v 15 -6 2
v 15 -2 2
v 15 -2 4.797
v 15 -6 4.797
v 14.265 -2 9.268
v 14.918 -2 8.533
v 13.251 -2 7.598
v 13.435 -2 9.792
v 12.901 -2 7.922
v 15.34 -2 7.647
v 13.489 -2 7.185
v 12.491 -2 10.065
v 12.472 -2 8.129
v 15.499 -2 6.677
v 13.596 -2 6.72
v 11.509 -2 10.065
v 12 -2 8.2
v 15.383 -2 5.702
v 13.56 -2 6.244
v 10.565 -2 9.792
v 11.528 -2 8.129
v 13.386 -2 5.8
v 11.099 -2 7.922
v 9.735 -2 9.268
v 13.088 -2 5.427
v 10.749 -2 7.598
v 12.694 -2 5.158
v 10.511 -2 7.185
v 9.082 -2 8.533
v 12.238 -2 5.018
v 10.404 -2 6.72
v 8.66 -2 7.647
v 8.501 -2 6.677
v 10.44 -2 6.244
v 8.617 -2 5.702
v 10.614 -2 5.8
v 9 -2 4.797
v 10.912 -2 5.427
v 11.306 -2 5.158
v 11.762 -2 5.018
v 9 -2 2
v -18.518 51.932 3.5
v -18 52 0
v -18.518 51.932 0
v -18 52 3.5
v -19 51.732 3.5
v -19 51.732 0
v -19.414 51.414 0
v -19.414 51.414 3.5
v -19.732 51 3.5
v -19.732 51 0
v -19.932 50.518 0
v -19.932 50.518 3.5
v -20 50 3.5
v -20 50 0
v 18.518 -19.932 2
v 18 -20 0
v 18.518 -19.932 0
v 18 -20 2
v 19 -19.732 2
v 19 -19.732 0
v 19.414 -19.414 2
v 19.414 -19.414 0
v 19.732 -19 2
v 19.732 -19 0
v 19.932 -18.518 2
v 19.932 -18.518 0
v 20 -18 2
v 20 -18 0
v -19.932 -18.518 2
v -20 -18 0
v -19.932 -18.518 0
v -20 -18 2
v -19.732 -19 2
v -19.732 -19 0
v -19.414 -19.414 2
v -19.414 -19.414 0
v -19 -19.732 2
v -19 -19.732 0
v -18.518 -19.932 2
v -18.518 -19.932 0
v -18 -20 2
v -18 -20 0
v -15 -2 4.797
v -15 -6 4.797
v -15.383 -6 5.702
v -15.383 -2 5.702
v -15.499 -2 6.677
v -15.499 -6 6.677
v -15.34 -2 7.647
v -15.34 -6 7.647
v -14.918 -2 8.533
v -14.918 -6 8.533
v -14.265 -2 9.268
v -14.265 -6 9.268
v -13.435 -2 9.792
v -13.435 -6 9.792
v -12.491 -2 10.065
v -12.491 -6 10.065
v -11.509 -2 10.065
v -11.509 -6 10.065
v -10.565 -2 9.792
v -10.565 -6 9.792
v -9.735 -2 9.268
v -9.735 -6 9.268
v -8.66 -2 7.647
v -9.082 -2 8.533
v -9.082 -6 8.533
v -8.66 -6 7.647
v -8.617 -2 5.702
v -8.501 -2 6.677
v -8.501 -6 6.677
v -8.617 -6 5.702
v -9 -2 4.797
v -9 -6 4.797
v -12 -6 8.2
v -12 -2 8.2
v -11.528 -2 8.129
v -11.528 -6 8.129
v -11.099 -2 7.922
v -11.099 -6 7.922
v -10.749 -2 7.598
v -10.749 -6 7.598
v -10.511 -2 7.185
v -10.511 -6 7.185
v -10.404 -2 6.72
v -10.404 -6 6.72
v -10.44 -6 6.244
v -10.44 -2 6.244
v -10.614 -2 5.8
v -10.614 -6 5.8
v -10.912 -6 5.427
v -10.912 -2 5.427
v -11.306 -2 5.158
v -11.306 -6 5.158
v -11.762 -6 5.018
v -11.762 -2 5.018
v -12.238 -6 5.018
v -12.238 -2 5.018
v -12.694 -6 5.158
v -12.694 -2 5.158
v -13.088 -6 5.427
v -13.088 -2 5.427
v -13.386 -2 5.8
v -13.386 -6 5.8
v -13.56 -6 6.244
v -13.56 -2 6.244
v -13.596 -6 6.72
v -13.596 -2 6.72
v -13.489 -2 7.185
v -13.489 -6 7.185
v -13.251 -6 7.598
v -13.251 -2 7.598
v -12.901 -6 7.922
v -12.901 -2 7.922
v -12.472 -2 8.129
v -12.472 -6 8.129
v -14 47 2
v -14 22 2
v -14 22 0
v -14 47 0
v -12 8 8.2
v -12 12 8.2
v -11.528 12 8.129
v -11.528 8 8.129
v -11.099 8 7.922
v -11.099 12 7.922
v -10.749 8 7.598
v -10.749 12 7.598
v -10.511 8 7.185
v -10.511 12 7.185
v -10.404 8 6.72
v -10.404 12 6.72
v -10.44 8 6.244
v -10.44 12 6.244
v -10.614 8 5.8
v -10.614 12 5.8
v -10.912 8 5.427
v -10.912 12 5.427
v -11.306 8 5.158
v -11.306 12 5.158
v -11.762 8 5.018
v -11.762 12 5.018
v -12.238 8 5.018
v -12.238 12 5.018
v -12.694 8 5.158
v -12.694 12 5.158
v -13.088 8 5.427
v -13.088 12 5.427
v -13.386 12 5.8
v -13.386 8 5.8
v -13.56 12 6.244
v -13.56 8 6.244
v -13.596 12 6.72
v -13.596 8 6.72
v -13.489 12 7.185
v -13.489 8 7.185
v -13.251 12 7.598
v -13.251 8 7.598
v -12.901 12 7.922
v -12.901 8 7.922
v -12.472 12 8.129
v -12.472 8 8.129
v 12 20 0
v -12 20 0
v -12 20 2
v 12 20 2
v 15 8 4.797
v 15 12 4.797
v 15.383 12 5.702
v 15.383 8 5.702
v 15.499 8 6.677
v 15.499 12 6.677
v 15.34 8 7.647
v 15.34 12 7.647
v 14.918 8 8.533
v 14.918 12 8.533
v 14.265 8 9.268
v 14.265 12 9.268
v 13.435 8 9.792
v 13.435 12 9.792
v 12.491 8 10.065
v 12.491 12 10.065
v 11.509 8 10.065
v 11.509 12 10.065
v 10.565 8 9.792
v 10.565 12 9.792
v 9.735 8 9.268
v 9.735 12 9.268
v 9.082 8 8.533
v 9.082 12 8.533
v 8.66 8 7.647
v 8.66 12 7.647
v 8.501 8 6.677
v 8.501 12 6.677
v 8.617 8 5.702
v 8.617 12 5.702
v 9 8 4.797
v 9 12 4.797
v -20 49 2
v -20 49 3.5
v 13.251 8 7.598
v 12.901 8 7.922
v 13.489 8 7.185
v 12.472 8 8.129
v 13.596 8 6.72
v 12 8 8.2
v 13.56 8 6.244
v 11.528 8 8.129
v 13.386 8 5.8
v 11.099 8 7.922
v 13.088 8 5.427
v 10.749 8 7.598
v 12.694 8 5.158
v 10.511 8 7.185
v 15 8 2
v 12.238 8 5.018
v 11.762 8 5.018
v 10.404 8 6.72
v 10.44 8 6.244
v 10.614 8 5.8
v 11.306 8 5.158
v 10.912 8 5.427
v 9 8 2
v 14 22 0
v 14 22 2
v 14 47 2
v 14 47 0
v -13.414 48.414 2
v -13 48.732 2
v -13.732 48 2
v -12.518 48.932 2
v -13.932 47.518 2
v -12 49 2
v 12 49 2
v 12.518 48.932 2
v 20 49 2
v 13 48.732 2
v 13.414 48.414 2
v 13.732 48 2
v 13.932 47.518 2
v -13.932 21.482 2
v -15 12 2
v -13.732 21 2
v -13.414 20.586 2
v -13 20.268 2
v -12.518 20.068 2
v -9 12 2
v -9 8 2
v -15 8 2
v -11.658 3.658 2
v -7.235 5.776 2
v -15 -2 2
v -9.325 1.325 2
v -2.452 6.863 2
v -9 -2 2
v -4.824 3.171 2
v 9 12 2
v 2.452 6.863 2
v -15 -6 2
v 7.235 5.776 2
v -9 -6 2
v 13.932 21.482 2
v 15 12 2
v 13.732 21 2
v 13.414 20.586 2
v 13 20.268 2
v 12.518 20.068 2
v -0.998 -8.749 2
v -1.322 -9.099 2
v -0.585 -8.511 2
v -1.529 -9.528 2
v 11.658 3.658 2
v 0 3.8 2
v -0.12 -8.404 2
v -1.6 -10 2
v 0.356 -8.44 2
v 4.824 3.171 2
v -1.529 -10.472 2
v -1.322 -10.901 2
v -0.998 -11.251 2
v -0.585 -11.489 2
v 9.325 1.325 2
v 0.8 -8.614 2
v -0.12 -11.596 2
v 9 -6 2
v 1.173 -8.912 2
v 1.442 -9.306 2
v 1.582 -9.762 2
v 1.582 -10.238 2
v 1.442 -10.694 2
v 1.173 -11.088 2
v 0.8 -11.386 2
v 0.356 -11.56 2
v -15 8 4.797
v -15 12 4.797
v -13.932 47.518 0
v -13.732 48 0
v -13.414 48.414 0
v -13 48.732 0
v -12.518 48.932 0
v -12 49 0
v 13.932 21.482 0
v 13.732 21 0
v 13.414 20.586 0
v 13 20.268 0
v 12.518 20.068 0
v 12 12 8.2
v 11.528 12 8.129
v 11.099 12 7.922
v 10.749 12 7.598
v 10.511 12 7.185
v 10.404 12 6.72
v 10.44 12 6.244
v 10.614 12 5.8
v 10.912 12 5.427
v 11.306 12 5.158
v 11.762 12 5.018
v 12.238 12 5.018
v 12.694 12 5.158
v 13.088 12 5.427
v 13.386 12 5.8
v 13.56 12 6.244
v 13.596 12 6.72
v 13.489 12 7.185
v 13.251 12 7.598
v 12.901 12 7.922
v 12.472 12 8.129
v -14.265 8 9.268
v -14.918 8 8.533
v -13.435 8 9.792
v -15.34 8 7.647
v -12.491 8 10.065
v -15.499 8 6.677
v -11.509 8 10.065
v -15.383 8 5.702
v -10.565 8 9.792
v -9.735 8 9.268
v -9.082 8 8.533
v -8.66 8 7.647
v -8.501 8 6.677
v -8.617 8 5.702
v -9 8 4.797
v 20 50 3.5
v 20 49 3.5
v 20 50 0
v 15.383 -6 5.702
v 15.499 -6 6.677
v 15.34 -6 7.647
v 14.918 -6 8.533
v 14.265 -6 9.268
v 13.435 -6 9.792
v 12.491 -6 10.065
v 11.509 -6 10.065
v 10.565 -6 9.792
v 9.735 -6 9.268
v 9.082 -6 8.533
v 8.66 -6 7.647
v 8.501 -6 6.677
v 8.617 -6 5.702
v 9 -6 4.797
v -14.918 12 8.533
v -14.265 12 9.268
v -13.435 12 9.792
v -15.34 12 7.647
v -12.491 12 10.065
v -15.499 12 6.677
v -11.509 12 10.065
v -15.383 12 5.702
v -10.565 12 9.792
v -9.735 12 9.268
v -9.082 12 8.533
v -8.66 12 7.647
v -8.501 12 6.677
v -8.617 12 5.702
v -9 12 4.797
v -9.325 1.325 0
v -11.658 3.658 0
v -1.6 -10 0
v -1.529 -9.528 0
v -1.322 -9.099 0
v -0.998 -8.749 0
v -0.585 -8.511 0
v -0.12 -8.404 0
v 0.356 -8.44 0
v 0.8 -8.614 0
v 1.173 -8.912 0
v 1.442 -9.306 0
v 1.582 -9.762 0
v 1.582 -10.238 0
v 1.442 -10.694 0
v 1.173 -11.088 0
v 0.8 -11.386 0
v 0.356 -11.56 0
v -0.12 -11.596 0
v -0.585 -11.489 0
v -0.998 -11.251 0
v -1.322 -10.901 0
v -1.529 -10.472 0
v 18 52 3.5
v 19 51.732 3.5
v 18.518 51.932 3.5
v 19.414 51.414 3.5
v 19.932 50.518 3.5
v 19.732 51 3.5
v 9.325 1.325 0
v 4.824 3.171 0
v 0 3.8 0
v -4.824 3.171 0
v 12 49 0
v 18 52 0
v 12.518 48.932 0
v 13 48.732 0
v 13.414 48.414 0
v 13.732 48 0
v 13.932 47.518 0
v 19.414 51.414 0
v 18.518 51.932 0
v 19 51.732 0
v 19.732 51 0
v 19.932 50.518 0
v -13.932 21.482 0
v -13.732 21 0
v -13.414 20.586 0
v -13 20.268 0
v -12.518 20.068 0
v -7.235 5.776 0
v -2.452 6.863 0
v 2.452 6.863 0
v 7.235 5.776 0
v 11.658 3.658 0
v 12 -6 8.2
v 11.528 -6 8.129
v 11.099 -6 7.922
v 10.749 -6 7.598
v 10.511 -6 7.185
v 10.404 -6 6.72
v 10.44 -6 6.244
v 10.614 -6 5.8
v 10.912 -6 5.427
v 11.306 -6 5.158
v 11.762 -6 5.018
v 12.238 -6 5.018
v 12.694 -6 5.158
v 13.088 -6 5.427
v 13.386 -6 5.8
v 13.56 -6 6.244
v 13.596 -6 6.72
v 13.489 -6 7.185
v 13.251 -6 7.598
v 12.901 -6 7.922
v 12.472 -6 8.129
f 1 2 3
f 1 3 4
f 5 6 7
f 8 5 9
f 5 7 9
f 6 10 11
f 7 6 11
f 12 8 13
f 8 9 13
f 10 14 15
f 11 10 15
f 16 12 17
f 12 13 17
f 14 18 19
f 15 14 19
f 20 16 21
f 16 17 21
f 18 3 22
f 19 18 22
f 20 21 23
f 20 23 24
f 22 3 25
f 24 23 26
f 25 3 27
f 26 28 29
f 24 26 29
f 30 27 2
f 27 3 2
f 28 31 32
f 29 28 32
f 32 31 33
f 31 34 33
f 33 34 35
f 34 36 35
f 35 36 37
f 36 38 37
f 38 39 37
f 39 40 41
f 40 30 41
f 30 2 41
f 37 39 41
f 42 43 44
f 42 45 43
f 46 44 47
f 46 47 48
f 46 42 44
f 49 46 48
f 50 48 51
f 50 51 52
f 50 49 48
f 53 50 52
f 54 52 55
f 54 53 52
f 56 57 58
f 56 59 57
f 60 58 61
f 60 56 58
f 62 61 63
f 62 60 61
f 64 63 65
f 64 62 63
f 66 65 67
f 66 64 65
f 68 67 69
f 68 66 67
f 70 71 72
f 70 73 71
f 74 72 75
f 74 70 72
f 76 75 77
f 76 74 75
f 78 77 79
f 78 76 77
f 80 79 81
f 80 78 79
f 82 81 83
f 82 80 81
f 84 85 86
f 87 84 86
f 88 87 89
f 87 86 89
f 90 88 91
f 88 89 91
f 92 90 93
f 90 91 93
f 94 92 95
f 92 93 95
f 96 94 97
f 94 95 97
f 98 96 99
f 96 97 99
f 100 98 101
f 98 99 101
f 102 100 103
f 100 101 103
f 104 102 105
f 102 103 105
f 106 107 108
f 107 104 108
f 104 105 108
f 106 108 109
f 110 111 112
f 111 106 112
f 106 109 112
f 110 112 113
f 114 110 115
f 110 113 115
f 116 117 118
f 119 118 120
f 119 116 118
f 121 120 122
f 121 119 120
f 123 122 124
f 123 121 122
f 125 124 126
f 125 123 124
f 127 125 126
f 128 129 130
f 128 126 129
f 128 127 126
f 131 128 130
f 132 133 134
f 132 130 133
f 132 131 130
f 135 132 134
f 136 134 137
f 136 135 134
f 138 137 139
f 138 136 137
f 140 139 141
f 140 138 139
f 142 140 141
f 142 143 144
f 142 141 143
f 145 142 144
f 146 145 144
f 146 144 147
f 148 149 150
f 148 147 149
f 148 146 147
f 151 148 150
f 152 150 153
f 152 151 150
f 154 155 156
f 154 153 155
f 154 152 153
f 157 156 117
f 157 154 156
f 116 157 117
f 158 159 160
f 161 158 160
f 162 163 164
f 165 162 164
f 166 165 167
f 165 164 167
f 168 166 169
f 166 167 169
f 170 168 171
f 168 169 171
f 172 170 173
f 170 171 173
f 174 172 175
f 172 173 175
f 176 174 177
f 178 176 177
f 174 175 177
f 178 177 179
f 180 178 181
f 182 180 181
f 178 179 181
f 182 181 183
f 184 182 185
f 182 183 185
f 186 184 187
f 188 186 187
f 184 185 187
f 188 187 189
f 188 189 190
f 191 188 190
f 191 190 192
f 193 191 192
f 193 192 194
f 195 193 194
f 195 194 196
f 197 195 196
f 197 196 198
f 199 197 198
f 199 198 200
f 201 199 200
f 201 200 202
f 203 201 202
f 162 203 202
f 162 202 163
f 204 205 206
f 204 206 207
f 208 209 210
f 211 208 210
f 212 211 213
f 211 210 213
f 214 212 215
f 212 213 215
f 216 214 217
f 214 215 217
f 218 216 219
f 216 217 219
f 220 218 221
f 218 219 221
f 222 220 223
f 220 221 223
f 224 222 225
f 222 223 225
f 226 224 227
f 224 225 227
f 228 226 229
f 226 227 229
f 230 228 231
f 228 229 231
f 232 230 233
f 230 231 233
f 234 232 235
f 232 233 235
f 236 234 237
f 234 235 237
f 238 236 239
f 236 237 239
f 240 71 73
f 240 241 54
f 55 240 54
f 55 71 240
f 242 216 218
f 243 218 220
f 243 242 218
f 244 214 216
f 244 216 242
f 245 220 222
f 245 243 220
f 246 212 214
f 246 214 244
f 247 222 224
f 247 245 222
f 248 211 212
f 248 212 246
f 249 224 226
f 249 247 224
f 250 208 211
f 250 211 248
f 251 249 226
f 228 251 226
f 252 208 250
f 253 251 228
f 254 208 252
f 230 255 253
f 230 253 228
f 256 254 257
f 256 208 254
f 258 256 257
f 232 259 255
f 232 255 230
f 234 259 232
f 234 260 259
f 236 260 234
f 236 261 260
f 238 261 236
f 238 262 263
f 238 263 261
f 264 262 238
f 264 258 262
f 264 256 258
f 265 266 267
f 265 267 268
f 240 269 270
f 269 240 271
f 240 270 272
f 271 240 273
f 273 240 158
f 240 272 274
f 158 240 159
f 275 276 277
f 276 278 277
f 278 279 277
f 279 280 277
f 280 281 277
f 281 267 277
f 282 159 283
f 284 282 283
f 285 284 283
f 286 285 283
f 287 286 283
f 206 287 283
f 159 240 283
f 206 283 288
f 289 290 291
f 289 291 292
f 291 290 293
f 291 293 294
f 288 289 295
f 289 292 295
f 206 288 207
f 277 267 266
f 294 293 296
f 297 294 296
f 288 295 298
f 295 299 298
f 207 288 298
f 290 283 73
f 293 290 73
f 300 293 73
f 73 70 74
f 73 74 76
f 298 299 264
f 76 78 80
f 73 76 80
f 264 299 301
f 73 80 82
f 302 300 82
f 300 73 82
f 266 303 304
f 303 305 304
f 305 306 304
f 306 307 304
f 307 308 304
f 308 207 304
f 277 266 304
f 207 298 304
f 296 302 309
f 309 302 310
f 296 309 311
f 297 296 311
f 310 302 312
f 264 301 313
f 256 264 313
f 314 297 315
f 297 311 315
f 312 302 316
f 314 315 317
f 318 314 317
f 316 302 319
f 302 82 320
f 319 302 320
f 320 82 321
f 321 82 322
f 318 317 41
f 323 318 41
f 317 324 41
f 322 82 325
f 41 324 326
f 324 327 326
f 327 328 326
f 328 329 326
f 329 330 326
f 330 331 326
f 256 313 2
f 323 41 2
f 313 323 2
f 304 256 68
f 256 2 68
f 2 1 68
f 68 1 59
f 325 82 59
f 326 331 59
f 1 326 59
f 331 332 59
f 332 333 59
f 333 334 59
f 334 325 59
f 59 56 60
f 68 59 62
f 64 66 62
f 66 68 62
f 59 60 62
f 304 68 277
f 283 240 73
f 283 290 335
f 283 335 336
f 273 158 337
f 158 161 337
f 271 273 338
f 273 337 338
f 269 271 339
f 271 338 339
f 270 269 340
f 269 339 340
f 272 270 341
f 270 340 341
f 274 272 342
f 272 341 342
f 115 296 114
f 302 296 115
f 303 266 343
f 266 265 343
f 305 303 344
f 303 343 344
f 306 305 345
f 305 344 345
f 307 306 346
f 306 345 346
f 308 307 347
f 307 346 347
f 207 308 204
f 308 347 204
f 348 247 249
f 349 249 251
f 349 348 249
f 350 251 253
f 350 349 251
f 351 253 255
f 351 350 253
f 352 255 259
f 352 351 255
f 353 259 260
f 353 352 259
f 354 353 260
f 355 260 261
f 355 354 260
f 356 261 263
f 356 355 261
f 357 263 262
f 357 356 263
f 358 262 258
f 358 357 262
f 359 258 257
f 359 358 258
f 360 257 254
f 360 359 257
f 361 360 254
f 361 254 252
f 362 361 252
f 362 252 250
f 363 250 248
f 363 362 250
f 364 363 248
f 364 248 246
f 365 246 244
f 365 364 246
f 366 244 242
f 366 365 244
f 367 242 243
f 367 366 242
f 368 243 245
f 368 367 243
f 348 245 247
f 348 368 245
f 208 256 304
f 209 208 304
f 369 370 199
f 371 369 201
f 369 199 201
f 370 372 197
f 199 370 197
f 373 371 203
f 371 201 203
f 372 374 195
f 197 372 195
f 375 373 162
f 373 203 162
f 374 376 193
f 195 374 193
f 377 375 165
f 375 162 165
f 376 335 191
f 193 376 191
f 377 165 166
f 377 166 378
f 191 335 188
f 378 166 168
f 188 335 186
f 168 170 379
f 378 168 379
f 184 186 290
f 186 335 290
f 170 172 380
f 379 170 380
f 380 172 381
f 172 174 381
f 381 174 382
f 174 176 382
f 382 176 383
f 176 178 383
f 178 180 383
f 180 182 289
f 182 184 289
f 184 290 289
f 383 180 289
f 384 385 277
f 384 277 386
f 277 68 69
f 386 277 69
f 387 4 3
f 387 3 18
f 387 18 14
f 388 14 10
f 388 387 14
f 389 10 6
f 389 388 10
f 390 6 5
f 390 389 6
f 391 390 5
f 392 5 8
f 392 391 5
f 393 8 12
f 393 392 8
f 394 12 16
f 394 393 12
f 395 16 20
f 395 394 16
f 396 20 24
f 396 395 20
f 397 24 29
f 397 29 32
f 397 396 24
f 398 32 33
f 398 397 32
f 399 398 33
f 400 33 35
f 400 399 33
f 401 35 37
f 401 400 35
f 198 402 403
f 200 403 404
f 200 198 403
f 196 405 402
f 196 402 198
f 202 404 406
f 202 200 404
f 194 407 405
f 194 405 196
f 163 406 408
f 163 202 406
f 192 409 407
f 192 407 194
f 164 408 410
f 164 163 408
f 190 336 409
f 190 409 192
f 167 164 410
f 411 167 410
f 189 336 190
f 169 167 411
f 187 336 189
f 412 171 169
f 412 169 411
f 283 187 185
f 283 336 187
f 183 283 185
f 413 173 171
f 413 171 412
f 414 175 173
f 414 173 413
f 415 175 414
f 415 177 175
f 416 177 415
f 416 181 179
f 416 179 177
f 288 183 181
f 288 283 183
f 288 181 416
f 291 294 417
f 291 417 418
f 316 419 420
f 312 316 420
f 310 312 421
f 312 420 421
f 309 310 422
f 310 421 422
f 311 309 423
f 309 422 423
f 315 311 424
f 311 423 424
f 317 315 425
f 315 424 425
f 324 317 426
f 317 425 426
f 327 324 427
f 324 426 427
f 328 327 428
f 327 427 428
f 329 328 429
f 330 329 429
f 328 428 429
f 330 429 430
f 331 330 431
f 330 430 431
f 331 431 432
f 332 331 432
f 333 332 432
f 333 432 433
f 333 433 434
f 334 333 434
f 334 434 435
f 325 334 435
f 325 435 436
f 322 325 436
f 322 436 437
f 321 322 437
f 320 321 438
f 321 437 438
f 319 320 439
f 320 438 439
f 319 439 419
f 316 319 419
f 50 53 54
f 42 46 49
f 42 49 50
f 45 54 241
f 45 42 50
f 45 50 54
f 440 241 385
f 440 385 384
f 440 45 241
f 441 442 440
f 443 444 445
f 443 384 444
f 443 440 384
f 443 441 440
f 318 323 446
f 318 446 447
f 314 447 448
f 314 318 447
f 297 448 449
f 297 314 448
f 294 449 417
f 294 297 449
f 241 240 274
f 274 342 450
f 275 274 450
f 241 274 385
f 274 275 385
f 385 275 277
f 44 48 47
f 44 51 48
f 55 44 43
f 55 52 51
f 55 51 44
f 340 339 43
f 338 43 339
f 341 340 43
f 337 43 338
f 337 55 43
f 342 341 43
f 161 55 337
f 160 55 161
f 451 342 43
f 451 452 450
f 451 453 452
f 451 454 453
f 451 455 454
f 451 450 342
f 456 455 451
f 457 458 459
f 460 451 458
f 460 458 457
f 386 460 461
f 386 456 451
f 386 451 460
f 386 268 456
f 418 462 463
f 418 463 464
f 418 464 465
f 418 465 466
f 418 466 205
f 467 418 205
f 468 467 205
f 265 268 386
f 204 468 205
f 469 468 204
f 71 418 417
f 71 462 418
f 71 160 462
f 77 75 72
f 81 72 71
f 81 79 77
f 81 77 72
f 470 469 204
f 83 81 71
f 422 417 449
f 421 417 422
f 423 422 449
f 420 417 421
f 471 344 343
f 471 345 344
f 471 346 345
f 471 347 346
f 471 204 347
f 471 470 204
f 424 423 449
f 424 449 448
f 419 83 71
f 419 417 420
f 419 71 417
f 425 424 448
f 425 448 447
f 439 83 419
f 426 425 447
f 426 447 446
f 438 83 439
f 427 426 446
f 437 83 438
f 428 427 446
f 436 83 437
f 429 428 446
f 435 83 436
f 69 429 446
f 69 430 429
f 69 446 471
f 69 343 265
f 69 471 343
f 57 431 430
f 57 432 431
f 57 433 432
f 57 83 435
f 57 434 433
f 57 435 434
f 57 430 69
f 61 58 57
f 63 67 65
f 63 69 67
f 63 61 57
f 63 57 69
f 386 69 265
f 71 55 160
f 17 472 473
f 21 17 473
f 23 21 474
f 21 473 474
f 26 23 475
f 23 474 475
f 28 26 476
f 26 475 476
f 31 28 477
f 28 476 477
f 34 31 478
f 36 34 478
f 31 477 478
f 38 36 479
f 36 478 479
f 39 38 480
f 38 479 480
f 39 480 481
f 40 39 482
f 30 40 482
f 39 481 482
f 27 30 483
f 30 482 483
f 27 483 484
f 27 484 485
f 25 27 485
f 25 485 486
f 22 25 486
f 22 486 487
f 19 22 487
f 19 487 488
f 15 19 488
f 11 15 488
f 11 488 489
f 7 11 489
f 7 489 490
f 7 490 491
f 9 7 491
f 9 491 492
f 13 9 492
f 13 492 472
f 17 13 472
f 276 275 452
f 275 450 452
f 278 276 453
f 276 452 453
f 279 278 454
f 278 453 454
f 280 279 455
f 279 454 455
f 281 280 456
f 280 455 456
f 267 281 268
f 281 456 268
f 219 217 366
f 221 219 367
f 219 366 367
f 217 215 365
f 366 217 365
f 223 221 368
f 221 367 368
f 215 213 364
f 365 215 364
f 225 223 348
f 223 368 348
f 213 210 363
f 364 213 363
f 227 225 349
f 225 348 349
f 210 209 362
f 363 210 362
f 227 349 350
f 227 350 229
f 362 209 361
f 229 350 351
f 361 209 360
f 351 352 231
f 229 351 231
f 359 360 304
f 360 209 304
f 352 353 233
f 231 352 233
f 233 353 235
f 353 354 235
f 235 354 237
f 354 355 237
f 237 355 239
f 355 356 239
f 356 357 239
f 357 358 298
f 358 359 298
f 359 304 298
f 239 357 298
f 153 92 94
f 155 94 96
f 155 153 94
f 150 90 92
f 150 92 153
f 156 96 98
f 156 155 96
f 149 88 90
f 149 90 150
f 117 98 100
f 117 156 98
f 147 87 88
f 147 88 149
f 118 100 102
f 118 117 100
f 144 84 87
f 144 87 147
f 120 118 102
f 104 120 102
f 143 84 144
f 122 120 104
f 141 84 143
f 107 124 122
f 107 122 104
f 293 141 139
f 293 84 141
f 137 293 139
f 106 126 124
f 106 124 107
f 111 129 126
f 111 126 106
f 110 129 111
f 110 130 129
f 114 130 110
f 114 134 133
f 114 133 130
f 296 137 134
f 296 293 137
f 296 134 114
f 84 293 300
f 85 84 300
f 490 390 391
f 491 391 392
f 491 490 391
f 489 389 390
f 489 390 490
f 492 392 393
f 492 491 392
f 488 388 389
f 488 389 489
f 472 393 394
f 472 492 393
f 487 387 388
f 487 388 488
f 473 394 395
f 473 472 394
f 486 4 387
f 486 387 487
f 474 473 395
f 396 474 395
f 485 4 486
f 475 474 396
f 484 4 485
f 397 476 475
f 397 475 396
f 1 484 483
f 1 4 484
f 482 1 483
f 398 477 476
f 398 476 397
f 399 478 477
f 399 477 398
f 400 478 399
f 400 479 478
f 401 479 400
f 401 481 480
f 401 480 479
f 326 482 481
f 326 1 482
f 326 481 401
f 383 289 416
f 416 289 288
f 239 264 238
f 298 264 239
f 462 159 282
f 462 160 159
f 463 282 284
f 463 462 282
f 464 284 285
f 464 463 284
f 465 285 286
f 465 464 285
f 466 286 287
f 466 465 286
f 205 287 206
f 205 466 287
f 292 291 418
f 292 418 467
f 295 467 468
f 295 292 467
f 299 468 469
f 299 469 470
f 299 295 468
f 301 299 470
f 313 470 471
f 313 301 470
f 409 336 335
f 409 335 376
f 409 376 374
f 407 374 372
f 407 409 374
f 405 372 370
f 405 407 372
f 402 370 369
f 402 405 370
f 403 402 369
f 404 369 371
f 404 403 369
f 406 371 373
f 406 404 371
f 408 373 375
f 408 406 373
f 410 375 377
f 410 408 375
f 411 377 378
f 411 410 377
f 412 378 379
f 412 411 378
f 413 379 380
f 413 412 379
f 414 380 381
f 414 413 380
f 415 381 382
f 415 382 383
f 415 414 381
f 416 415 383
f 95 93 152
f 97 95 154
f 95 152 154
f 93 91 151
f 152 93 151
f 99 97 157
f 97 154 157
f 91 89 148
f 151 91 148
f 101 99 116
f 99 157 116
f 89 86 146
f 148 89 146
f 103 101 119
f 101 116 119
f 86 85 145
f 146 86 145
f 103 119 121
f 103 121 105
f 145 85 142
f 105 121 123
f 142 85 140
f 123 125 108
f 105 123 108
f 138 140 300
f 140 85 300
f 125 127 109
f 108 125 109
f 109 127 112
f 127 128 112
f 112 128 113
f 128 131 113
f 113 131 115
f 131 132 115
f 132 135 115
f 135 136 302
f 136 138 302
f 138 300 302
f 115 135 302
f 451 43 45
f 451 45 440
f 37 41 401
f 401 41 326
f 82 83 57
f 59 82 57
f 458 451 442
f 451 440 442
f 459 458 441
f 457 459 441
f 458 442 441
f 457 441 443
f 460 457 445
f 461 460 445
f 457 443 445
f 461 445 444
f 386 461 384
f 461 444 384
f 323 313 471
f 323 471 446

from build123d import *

# Parameters (mm, degrees)
SKETCH1_W                                    = 40
SKETCH1_H                                    = 40
BOSS_EXTRUDE2_DEPTH                          = 2
SKETCH2_W                                    = 6
SKETCH2_H                                    = 4
BOSS_EXTRUDE5_DEPTH                          = 3
SKETCH4_R                                    = 3.5
SKETCH4_R_2                                  = 1.6
BOSS_EXTRUDE6_DEPTH                          = 4
MIRROR2_AT_THE_SECOND_PLANE_COPY_1_SKETC_W   = 6
MIRROR2_AT_THE_SECOND_PLANE_COPY_1_SKETC_H   = 4
MIRROR2_AT_THE_SECOND_PLANE_COPY_1_DEPTH     = 3
MIRROR2_AT_THE_SECOND_PLANE_COPY_2_SKETC_R   = 3.5
MIRROR2_AT_THE_SECOND_PLANE_COPY_2_SKETC_R_2 = 1.6
MIRROR2_AT_THE_SECOND_PLANE_COPY_2_DEPTH     = 4
CUT_EXTRUDE2_DEPTH                           = 2
SKETCH8_R                                    = 1.6
CUT_EXTRUDE3_DEPTH                           = 2
SKETCH18_W                                   = 6
SKETCH18_H                                   = 2
BOSS_EXTRUDE10_DEPTH                         = 32
SKETCH19_W                                   = 6
SKETCH19_H                                   = 2
BOSS_EXTRUDE11_DEPTH                         = 3
FILLET1_R                                    = 2


with BuildPart() as part:
    # Sketch1 → Boss-Extrude2 (new body)
    with BuildSketch(Plane.XY):
        Rectangle(SKETCH1_W, SKETCH1_H)
    extrude(amount=BOSS_EXTRUDE2_DEPTH)

    # Sketch2 → Boss-Extrude5 (add)
    with BuildSketch(Plane.XY.offset(2)):
        with Locations((-12, 10)):
            Rectangle(SKETCH2_W, SKETCH2_H)
    boss_extrude5 = extrude(amount=BOSS_EXTRUDE5_DEPTH)

    # Sketch4 → Boss-Extrude6 (add)
    with BuildSketch(Plane(origin=(0, 12, 0), x_dir=(1, 0, 0), z_dir=(0, 1, 0))):
        with Locations((-12, -6.6)):
            Circle(SKETCH4_R)
        with Locations(Location((-12, -6.6, 0), (0, 0, 270))):
            Circle(SKETCH4_R_2, mode=Mode.SUBTRACT)
    boss_extrude6 = extrude(amount=-BOSS_EXTRUDE6_DEPTH)

    # Mirror2: Boss-Extrude5, Boss-Extrude6 across plane
    add(boss_extrude5.mirror(Plane(origin=(0, 0, 0), x_dir=(0, 0, 1), z_dir=(1, 0, 0))))
    add(boss_extrude6.mirror(Plane(origin=(0, 0, 0), x_dir=(0, 0, 1), z_dir=(1, 0, 0))))

    # Mirror2 at the second plane: Boss-Extrude5, Boss-Extrude6 across plane
    add(boss_extrude5.mirror(Plane(origin=(0, 3, 0), x_dir=(0, 0, 1), z_dir=(0, -1, 0))))
    add(boss_extrude6.mirror(Plane(origin=(0, 3, 0), x_dir=(0, 0, 1), z_dir=(0, -1, 0))))

    # Mirror2 at the second plane copy 1 sketc → Mirror2 at the second plane copy 1 (add)
    with BuildSketch(Plane(origin=(0, 6, 2), x_dir=(-1, 0, 0), z_dir=(0, 0, 1))):
        with Locations((-12, 10)):
            Rectangle(MIRROR2_AT_THE_SECOND_PLANE_COPY_1_SKETC_W, MIRROR2_AT_THE_SECOND_PLANE_COPY_1_SKETC_H)
    extrude(amount=MIRROR2_AT_THE_SECOND_PLANE_COPY_1_DEPTH)

    # Mirror2 at the second plane copy 2 sketc → Mirror2 at the second plane copy 2 (add)
    with BuildSketch(Plane(origin=(0, -6, 0), x_dir=(-1, 0, 0), z_dir=(0, -1, 0))):
        with Locations((-12, -6.6)):
            Circle(MIRROR2_AT_THE_SECOND_PLANE_COPY_2_SKETC_R)
        with Locations(Location((-12, -6.6, 0), (0, 0, 270))):
            Circle(MIRROR2_AT_THE_SECOND_PLANE_COPY_2_SKETC_R_2, mode=Mode.SUBTRACT)
    extrude(amount=-MIRROR2_AT_THE_SECOND_PLANE_COPY_2_DEPTH)

    # Sketch7 → Cut-Extrude2 (cut)
    with BuildSketch(Plane.XY.offset(2)):
        with BuildLine():
            ThreePointArc((9.324585763, 1.324585763), (0, 3.8), (-9.324585763, 1.324585763))
            Line((-9.324585763, 1.324585763), (-11.657506391, 3.657506391))
            ThreePointArc((-11.657506391, 3.657506391), (0, 7), (11.657506391, 3.657506391))
            Line((11.657506391, 3.657506391), (9.324585763, 1.324585763))
        make_face()
    extrude(amount=-CUT_EXTRUDE2_DEPTH, mode=Mode.SUBTRACT)

    # Sketch8 → Cut-Extrude3 (cut)
    with BuildSketch(Plane(origin=(0, 0, 0), x_dir=(-1, 0, 0), z_dir=(0, 0, -1))):
        with Locations((0, -10)):
            Circle(SKETCH8_R)
    extrude(amount=-CUT_EXTRUDE3_DEPTH, mode=Mode.SUBTRACT)

    # Sketch18 → Boss-Extrude10 (add)
    with BuildSketch(Plane(origin=(0, 20, 0), x_dir=(1, 0, 0), z_dir=(0, 1, 0))):
        with Locations((17, -1)):
            Rectangle(SKETCH18_W, SKETCH18_H)
        with Locations((-17, -1)):
            Rectangle(SKETCH18_W, SKETCH18_H)
    extrude(amount=BOSS_EXTRUDE10_DEPTH)

    # Sketch19 → Boss-Extrude11 (add)
    with BuildSketch(Plane(origin=(0, 52, 0), x_dir=(1, 0, 0), z_dir=(0, 1, 0))):
        Polygon((20, 0), (-14, 0), (-14, -2), (-20, -2), (-20, -3.5), (20, -3.5), align=None)
        with Locations((-17, -1)):
            Rectangle(SKETCH19_W, SKETCH19_H)
    extrude(amount=-BOSS_EXTRUDE11_DEPTH)

    # Fillet1
    fillet1_edges = [part.edges().sort_by_distance(p)[0] for p in [
        (20, 52, 1.75),
        (14, 20, 1),
        (-20, 52, 1.75),
        (-14, 20, 1),
        (-14, 49, 1),
        (14, 49, 1),
        (20, -20, 1),
        (-20, -20, 1),
    ]]
    fillet(fillet1_edges, radius=FILLET1_R)


solid = part.part
